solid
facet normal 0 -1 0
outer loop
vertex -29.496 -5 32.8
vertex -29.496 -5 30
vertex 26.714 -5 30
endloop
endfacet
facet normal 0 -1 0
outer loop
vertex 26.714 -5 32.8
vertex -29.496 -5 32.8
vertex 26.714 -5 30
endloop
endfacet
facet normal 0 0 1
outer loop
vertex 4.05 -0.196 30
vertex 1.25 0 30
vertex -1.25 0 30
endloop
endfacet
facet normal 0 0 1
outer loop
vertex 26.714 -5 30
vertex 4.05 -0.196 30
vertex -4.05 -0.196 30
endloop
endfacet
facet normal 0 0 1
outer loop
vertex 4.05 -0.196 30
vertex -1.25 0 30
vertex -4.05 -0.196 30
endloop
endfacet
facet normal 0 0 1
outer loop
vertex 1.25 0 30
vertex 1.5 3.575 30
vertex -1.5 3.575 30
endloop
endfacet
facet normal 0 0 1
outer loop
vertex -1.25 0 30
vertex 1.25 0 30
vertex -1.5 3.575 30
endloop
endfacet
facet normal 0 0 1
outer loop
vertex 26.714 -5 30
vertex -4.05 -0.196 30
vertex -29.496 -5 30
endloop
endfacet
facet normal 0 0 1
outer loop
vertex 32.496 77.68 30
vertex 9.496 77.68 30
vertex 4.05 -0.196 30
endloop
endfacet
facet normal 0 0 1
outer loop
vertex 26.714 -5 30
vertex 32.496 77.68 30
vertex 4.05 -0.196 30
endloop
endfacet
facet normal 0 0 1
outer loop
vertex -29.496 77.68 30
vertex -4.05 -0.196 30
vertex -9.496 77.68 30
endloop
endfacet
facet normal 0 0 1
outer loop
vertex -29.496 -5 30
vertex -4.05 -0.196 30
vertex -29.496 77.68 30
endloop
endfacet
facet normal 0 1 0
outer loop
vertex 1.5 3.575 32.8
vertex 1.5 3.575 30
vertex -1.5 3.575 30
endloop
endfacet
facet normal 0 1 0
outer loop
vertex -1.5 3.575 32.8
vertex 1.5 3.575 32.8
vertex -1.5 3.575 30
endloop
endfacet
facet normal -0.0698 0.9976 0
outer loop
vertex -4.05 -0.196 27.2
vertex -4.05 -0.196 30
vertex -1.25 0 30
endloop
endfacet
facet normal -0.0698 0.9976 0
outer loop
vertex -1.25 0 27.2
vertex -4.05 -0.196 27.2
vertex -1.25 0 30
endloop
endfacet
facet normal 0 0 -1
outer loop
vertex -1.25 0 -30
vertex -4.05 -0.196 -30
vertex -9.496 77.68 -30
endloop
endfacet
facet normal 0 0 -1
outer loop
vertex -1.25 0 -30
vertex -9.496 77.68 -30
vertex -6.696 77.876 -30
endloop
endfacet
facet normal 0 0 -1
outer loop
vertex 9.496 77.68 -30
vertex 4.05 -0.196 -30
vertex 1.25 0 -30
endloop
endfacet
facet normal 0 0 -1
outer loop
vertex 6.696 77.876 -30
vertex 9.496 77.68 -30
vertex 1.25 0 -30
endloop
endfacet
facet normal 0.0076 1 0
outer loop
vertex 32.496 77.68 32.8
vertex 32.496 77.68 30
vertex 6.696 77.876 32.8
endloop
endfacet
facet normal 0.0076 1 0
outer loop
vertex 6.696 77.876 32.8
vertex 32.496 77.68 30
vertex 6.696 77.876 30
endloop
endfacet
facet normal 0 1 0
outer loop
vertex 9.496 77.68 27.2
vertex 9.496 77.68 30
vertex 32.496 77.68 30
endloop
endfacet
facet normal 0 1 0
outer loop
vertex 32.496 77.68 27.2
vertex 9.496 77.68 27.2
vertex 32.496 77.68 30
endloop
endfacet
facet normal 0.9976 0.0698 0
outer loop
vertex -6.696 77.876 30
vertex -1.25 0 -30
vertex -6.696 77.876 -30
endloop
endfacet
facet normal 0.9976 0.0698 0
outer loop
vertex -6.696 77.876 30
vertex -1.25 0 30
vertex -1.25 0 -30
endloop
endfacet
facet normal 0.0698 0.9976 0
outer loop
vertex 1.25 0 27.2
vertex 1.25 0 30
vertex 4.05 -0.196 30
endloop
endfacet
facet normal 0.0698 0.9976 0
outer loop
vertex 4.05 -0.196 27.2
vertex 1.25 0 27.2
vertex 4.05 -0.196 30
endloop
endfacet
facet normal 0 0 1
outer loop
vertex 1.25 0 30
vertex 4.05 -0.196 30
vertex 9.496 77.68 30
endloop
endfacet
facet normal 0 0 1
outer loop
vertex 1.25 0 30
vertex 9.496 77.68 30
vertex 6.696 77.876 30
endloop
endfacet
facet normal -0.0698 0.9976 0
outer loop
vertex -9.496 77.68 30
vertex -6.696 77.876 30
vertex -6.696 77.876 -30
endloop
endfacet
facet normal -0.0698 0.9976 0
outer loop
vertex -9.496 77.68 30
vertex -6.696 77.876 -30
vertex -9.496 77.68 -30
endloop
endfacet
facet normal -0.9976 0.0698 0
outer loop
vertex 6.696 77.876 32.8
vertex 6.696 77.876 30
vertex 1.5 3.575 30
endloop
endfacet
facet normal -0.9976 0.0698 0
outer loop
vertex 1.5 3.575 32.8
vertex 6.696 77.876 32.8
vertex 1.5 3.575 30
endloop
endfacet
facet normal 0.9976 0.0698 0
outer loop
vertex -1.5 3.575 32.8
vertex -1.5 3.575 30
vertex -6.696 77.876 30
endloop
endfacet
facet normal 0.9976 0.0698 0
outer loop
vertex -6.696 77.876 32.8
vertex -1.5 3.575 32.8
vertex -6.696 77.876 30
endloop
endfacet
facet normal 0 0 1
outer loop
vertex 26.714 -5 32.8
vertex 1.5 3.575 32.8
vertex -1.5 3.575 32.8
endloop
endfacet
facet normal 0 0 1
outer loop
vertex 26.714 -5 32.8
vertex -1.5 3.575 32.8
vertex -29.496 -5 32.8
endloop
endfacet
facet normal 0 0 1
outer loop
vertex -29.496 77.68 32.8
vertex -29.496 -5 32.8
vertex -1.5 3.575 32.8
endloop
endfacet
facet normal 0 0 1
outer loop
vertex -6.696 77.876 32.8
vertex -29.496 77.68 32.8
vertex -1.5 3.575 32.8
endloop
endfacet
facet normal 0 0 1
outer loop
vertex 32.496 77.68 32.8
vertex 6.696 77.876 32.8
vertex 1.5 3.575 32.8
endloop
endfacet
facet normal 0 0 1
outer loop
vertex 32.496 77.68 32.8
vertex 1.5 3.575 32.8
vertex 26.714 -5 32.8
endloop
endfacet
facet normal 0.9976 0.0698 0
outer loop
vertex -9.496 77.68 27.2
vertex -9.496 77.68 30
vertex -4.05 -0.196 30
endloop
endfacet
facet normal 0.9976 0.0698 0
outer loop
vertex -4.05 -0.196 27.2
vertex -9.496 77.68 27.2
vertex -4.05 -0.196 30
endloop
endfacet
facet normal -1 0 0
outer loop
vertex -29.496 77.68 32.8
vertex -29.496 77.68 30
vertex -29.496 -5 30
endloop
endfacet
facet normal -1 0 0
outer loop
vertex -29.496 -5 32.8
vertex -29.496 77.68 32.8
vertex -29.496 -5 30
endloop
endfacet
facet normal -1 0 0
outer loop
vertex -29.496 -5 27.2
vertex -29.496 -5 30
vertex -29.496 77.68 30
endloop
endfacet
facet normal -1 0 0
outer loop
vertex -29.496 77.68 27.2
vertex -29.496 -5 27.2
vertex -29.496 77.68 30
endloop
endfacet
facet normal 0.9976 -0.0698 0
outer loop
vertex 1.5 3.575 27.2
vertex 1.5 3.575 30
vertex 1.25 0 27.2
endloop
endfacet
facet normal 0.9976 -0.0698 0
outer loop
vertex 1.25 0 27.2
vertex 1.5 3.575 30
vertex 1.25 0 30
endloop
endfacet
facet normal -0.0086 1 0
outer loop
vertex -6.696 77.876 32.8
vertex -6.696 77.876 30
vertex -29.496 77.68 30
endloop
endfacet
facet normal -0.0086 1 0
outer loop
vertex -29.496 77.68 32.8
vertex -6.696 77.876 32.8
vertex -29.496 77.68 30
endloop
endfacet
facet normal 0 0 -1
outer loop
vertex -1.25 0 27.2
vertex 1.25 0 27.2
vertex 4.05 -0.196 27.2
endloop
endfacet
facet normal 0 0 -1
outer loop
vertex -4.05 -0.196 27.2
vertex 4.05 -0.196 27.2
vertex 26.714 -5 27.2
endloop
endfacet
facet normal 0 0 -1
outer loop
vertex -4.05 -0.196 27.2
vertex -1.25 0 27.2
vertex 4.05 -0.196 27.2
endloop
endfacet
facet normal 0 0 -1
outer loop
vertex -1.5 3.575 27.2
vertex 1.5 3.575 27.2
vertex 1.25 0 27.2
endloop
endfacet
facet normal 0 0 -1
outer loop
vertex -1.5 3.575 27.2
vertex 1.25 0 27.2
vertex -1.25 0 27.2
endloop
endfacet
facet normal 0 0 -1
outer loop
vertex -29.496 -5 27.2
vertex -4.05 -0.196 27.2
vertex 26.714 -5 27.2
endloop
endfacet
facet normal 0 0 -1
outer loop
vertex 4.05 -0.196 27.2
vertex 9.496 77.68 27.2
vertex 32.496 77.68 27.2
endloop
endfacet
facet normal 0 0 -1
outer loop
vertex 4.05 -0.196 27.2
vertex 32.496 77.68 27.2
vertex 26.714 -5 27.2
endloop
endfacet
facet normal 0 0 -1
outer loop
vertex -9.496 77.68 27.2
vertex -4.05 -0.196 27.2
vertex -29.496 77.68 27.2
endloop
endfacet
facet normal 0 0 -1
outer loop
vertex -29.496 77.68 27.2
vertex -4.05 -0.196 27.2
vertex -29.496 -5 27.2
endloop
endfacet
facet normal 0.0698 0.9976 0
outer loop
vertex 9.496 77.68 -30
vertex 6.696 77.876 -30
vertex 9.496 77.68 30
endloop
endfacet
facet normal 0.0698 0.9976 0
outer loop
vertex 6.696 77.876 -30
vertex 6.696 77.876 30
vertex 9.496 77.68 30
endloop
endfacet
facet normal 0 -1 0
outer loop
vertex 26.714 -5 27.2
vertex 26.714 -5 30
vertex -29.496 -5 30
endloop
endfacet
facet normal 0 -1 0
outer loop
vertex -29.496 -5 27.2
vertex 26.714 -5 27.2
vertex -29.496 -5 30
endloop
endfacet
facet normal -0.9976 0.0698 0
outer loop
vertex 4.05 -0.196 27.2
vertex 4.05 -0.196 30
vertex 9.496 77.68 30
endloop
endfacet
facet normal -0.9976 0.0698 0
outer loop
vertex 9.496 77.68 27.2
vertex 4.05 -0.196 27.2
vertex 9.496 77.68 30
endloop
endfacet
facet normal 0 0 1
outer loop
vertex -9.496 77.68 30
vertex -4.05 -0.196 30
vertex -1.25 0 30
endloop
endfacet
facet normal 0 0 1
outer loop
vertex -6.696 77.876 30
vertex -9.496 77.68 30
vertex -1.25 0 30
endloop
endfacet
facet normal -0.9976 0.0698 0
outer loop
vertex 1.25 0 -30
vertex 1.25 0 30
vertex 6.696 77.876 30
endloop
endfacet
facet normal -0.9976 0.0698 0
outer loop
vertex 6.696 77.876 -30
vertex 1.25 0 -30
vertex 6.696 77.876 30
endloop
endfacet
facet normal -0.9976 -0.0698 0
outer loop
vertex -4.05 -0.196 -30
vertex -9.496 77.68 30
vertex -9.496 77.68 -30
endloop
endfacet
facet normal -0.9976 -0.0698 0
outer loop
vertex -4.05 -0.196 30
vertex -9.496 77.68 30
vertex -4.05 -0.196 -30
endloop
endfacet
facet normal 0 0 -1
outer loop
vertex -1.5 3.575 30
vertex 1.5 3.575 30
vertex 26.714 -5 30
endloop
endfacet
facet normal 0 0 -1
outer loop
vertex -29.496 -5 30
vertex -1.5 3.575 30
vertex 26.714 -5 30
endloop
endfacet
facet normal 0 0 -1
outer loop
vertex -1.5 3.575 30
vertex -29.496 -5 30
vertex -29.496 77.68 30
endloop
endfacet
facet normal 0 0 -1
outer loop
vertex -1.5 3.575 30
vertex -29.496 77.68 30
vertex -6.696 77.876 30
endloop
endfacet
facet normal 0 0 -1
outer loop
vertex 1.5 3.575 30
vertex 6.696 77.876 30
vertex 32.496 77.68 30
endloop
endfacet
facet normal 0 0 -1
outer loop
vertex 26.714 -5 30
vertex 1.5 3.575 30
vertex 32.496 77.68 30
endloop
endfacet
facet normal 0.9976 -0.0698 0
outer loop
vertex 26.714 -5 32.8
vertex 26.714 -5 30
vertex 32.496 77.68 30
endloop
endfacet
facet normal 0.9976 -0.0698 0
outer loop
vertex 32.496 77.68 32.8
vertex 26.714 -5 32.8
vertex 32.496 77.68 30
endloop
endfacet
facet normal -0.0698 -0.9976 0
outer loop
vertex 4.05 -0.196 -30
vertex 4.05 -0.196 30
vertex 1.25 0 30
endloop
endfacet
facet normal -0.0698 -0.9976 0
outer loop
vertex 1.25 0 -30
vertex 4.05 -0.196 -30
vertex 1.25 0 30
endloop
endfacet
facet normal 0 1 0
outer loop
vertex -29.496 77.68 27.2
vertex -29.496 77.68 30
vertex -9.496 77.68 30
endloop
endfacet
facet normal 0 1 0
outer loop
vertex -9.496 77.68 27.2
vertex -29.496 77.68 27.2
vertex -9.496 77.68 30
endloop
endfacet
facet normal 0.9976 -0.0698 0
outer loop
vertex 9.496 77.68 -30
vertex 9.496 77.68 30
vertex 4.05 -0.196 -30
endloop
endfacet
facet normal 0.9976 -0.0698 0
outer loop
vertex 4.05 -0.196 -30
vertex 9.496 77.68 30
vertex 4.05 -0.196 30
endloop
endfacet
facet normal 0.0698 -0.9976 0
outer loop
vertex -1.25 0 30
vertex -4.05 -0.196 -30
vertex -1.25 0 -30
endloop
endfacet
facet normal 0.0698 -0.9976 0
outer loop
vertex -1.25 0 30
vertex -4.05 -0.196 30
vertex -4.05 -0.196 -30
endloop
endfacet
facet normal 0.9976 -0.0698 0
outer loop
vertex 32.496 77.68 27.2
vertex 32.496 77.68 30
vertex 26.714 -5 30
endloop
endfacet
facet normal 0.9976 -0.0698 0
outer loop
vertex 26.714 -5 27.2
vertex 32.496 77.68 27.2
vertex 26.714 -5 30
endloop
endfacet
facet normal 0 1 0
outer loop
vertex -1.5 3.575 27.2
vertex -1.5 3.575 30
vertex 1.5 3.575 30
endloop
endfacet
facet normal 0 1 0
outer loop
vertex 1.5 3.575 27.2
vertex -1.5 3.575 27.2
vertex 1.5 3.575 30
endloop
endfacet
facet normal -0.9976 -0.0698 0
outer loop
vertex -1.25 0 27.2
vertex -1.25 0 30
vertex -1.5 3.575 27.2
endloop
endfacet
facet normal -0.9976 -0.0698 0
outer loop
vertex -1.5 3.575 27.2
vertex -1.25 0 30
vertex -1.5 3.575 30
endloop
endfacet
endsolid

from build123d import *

# Parameters (mm, degrees)
BOSS_EXTRUDE1_DEPTH   = 30
BOSS_EXTRUDE1_2_DEPTH = 30
BOSS_EXTRUDE2_DEPTH   = 2.8
BOSS_EXTRUDE3_DEPTH   = 2.8


with BuildPart() as part:
    # Sketch1 → Boss-Extrude1 (new body, symmetric)
    with BuildSketch(Plane.XY):
        Polygon((-1.25, 0), (-6.695608717, 77.875832821), (-9.495608717, 77.680037747), (-4.05, -0.195795073), align=None)
    extrude(amount=BOSS_EXTRUDE1_DEPTH, both=True)


with BuildPart() as body_2:
    # Sketch1 → Boss-Extrude1 2 (new body, symmetric)
    with BuildSketch(Plane.XY):
        Polygon((1.25, 0), (6.695608717, 77.875832821), (9.495608717, 77.680037747), (4.05, -0.195795073), align=None)
    extrude(amount=BOSS_EXTRUDE1_2_DEPTH, both=True)


with BuildPart() as body_3:
    # Sketch2 → Boss-Extrude2 (new body)
    with BuildSketch(Plane.XY.offset(30)):
        Polygon((-1.5, 3.575166564), (1.5, 3.575166564), (1.25, 0), (4.05, -0.195795073), (9.495608717, 77.680037747), (32.495608717, 77.680037747), (26.714057266, -5), (-29.495608717, -5), (-29.495608717, 77.680037747), (-9.495608717, 77.680037747), (-4.05, -0.195795073), (-1.25, 0), align=None)
    extrude(amount=-BOSS_EXTRUDE2_DEPTH)


with BuildPart() as body_4:
    # Sketch3 → Boss-Extrude3 (new body)
    with BuildSketch(Plane.XY.offset(30)):
        Polygon((-6.695608717, 77.875832821), (-29.495608717, 77.680037747), (-29.495608717, -5), (26.714057266, -5), (32.495608717, 77.680037747), (6.695608717, 77.875832821), (1.5, 3.575166564), (-1.5, 3.575166564), align=None)
    extrude(amount=BOSS_EXTRUDE3_DEPTH)


solid = Compound([part.part, body_2.part, body_3.part, body_4.part])
